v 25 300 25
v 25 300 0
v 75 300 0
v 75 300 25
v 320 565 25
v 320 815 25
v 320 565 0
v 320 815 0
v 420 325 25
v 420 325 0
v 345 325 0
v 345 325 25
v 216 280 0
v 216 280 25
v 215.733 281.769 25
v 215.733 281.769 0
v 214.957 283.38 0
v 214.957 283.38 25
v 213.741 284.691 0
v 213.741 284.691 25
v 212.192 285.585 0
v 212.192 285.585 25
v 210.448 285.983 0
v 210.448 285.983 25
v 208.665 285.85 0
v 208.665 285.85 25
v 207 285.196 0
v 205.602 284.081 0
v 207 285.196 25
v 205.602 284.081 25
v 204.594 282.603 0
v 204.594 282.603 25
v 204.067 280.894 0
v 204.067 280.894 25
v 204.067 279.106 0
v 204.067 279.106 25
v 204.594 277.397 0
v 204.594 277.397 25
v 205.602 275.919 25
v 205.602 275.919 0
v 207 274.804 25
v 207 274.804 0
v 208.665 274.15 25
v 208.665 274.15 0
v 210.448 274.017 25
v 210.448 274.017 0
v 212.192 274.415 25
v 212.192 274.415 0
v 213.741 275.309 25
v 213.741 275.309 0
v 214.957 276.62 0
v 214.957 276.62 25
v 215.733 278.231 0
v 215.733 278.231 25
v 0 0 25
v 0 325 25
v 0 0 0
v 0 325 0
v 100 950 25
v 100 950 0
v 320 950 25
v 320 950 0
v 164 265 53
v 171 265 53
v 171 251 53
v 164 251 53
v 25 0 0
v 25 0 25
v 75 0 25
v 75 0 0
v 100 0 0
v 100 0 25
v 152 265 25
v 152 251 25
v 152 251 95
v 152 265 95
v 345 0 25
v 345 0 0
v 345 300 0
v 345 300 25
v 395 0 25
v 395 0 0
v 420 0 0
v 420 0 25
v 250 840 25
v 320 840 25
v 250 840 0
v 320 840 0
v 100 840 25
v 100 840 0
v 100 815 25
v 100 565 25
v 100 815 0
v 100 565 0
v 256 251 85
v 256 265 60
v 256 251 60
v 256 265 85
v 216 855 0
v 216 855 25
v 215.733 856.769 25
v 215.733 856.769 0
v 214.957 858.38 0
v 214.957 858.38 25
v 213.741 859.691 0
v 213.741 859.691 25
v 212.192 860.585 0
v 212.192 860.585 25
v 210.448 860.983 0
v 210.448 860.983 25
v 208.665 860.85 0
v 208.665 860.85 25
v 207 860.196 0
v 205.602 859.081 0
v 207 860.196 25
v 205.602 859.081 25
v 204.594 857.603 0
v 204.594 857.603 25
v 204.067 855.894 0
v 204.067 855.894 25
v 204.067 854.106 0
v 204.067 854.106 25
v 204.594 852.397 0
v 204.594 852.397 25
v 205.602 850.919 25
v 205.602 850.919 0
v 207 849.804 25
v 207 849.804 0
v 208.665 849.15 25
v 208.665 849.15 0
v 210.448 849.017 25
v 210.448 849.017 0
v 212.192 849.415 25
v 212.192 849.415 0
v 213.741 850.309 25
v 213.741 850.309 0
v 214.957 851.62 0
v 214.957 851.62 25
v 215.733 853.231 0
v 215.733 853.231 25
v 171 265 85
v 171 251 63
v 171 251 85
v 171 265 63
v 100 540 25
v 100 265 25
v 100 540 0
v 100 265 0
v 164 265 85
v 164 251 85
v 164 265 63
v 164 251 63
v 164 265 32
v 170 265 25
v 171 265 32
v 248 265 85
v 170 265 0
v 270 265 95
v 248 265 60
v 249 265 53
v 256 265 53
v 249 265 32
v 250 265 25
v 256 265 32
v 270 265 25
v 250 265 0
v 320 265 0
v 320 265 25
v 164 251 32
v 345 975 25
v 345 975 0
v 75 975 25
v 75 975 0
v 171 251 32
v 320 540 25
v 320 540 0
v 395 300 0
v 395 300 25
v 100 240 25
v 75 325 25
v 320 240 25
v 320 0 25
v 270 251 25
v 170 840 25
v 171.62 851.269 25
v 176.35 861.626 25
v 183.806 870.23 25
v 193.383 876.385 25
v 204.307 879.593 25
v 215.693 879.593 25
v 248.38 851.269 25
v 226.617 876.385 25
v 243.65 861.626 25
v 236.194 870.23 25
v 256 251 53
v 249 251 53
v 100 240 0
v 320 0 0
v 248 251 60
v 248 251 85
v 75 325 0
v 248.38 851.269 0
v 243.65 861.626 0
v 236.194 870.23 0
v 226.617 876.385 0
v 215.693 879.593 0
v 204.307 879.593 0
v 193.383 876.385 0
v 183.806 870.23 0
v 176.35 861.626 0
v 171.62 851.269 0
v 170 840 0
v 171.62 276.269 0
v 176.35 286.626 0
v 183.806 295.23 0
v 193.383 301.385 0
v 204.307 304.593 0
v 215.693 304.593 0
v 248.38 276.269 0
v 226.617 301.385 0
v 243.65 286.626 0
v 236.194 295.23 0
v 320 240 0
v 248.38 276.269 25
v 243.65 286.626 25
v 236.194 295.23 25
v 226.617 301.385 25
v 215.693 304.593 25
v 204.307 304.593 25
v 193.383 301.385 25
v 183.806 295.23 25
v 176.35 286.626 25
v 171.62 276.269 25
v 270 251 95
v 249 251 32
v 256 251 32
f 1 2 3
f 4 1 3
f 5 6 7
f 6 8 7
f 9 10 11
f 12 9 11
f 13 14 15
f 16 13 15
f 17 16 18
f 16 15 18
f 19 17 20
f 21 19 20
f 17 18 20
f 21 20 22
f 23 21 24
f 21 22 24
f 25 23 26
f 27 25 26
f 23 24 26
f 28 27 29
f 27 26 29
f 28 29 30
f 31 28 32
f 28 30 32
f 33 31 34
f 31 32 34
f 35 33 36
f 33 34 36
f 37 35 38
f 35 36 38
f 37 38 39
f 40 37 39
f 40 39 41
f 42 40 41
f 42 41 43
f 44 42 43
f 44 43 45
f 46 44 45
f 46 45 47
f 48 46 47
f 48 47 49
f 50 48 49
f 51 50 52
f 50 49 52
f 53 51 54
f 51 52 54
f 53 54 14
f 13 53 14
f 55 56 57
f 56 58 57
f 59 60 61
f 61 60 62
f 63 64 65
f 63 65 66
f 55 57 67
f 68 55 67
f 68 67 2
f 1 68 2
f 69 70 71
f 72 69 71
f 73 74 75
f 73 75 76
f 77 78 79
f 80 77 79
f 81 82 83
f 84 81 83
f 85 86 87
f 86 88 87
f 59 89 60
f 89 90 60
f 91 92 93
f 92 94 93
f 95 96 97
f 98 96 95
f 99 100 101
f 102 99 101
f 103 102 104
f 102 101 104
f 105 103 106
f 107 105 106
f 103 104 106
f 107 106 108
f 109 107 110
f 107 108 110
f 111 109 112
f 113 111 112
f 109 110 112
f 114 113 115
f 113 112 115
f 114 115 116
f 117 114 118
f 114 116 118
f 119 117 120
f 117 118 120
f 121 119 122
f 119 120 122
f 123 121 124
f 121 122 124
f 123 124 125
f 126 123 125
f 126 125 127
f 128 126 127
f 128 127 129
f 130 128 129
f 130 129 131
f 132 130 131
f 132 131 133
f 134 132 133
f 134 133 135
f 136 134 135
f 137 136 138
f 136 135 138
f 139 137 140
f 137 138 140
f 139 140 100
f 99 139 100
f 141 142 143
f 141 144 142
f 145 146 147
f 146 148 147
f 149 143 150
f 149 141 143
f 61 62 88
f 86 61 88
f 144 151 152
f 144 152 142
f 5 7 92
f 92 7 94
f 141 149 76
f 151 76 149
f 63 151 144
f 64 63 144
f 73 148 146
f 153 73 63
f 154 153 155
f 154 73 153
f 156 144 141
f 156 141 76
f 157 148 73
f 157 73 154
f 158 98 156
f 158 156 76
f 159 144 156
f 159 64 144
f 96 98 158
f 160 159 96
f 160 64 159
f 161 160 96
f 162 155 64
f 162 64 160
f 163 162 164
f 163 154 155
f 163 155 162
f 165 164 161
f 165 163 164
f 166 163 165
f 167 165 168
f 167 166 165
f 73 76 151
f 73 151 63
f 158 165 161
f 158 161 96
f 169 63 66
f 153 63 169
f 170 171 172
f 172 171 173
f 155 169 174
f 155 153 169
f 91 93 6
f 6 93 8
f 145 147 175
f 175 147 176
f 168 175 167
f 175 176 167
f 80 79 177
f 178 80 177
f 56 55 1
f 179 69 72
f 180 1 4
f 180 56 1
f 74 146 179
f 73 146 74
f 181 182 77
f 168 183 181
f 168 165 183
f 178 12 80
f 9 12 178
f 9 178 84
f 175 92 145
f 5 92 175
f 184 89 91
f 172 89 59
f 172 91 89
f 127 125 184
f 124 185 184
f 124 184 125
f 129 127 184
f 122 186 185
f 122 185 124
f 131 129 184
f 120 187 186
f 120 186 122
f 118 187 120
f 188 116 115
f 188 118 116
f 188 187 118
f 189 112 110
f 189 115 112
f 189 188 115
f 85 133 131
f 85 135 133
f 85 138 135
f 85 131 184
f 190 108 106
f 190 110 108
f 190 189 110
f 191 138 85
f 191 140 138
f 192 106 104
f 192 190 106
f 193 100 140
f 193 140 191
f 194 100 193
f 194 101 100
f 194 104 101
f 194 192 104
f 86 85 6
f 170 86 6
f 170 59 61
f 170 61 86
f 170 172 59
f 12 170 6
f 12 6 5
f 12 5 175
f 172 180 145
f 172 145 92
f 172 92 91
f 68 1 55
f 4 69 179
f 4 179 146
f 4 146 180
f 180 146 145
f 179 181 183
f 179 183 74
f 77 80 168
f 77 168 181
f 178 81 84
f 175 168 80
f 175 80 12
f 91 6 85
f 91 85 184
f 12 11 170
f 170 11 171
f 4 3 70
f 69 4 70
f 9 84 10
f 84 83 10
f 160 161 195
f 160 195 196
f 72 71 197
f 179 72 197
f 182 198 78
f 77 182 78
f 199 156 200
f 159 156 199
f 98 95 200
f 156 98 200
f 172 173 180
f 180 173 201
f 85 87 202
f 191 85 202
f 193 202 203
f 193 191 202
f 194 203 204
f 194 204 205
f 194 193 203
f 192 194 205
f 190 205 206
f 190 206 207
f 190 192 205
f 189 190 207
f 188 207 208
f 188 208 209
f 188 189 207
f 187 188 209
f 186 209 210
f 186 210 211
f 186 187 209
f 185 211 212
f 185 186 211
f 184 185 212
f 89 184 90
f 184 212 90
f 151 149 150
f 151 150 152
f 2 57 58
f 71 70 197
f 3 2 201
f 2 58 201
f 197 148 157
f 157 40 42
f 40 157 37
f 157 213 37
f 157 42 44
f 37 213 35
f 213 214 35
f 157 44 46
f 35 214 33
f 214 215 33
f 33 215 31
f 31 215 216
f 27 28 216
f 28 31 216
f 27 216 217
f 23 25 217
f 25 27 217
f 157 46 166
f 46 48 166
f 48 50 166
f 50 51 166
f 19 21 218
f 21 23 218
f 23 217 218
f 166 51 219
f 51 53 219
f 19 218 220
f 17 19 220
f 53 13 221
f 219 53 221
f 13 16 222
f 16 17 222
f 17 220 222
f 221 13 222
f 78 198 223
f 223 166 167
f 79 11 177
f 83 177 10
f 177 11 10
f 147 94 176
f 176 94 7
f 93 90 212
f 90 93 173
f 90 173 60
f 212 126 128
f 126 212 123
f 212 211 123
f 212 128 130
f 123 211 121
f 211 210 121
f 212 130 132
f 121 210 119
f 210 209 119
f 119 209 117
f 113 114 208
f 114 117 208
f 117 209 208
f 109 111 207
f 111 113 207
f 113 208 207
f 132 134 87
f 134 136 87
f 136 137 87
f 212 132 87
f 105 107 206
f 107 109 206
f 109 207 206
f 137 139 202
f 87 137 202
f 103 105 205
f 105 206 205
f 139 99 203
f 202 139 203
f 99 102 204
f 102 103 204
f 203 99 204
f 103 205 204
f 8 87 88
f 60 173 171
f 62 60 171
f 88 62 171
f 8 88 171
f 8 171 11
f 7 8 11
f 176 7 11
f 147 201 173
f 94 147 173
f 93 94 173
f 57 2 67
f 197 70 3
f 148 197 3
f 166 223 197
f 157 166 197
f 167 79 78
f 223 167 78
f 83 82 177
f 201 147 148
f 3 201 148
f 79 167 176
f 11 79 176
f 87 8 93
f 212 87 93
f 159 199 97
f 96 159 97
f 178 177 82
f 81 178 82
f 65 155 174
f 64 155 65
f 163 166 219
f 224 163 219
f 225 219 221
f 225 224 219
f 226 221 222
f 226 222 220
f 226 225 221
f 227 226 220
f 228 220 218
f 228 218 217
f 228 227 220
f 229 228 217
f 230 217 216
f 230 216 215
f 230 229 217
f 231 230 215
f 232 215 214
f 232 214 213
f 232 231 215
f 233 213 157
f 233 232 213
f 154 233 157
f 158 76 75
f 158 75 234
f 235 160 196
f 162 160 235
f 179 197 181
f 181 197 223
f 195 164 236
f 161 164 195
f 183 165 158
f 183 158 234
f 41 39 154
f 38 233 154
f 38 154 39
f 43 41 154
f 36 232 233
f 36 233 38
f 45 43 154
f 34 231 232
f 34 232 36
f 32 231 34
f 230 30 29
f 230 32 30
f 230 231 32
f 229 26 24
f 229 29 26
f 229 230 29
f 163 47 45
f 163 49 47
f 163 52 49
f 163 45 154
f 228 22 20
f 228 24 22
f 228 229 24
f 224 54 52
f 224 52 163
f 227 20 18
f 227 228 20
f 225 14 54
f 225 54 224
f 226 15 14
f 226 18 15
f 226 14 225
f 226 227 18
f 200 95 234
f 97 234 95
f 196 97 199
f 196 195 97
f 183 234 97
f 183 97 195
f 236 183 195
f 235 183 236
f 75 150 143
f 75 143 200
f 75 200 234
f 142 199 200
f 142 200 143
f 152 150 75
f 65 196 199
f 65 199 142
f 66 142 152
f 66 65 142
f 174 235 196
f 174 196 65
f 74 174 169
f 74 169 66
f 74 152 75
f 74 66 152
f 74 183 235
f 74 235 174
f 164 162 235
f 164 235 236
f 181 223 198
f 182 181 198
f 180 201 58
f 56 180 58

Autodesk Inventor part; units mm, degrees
ref_plane "YZ Plane" through (0, 0, 0) normal (1, 0, 0) x (0, 1, 0)
ref_plane "XZ Plane" through (0, 0, 0) normal (0, 1, 0) x (-1, 0, 0)
ref_plane "XY Plane" through (0, 0, 0) normal (0, 0, 1) x (1, 0, 0)
sketch "Sketch1" plane through (0, 0, 0) normal (0, 0, 1) x (1, 0, 0)
  point P0 (0, 0)
sketch "Sketch2" plane through (0, 0, 0) normal (0, 0, 1) x (1, 0, 0)
  line L0 (0, 0) -> (25, 0)
  line L1 (25, 0) -> (25, 300)
  line L2 (25, 300) -> (75, 300)
  line L3 (75, 300) -> (75, 0)
  line L4 (75, 0) -> (100, 0)
  line L5 (100, 0) -> (100, 240)
  line L6 (100, 240) -> (320, 240)
  line L7 (320, 240) -> (320, 0)
  line L8 (320, 0) -> (345, 0)
  line L9 (345, 0) -> (345, 300)
  line L10 (345, 300) -> (395, 300)
  line L11 (395, 300) -> (395, 0)
  line L12 (395, 0) -> (420, 0)
  line L13 (420, 0) -> (420, 325)
  line L14 (420, 325) -> (345, 325)
  line L15 (345, 325) -> (345, 975)
  line L16 (345, 975) -> (75, 975)
  line L17 (75, 975) -> (75, 325)
  line L18 (75, 325) -> (0, 325)
  line L19 (0, 325) -> (0, 0)
  dimension "d0" = 25
  dimension "d1" = 300
  dimension "d2" = 50
  dimension "d3" = 300
  dimension "d4" = 25
  dimension "d5" = 240
  dimension "d6" = 220
  dimension "d7" = 240
  dimension "d8" = 25
  dimension "d9" = 300
  dimension "d10" = 50
  dimension "d11" = 300
  dimension "d12" = 25
  dimension "d13" = 325
  dimension "d14" = 75
  dimension "d15" = 650
  dimension "d16" = 270
  dimension "d17" = 650
  dimension "d18" = 75
sketch "Sketch3" plane through (0, 0, 0) normal (0, 0, 1) x (1, 0, 0)
  line L0 (100, 950) -> (320, 950)
  line L1 (320, 950) -> (320, 840)
  line L2 (320, 840) -> (100, 840)
  line L3 (100, 840) -> (100, 950)
  line L4 (100, 815) -> (320, 815)
  line L5 (320, 815) -> (320, 565)
  line L6 (320, 565) -> (100, 565)
  line L7 (100, 565) -> (100, 815)
  line L8 (100, 540) -> (320, 540)
  line L9 (320, 540) -> (320, 265)
  line L10 (320, 265) -> (100, 265)
  line L11 (100, 265) -> (100, 540)
  point P0 (0, 0)
  dimension "d19" = 220
  dimension "d20" = 110
  dimension "d21" = 220
  dimension "d22" = 250
  dimension "d23" = 220
  dimension "d24" = 275
extrude "Extrusion1" add sketch "Sketch2" along normal blind 25
extrude "Extrusion2" cut sketch "Sketch3" along normal through all
sketch "Sketch4" plane through (0, 0, 25) normal (0, 0, 1) x (1, 0, 0)
  line L0 (100, 840) -> (320, 840) projected
  arc A0 (250, 840) -> (170, 840) centre (210, 840) ccw
  point P0 (0, 0)
extrude "Extrusion3" add sketch "Sketch4" against normal blind 25
sketch "Sketch5" plane through (0, 0, 25) normal (0, 0, 1) x (1, 0, 0)
  point P0 (0, 0)
sketch "Sketch6" plane through (0, 0, 25) normal (0, 0, 1) x (1, 0, 0)
  line L0 (320, 265) -> (100, 265) projected
  arc A0 (250, 265) -> (170, 265) centre (210, 265) ccw
  point P0 (0, 0)
  dimension "d31" = 40
extrude "Extrusion4" add sketch "Sketch6" against normal blind 25
sketch "Sketch7" plane through (0, 0, 25) normal (0, 0, 1) x (1, 0, 0)
  line L0 (170, 265) -> (100, 265) projected
  line L1 (152, 265) -> (270, 265)
  line L2 (270, 265) -> (270, 251)
  line L3 (270, 251) -> (152, 251)
  line L4 (152, 251) -> (152, 265)
  point P0 (0, 0)
extrude "Extrusion5" add sketch "Sketch7" along normal blind 70
sketch "Sketch8" plane through (100, 265, 25) normal (0, 1, 0) x (1, 0, 0)
  point P0 (-100, 25)
sketch "Sketch9" plane through (100, 265, 25) normal (0, 1, 0) x (1, 0, 0)
  line L0 (64, -7) -> (71, -7)
  line L1 (71, -7) -> (71, -28)
  line L2 (71, -28) -> (64, -28)
  line L3 (64, -28) -> (64, -7)
  line L4 (64, -38) -> (71, -38)
  line L5 (71, -38) -> (71, -60)
  line L6 (71, -60) -> (64, -60)
  line L7 (64, -60) -> (64, -38)
  line L8 (149, -7) -> (156, -7)
  line L9 (156, -7) -> (156, -28)
  line L10 (156, -28) -> (149, -28)
  line L11 (149, -28) -> (149, -7)
  line L12 (148, -35) -> (156, -35)
  line L13 (156, -35) -> (156, -60)
  line L14 (156, -60) -> (148, -60)
  line L15 (148, -60) -> (148, -35)
  point P0 (-100, 25)
extrude "Extrusion6" cut sketch "Sketch9" against normal through all
sketch "Sketch10" plane through (0, 0, 25) normal (0, 0, 1) x (1, 0, 0)
  circle A0 centre (210, 280) radius 6
  point P0 (0, 0)
  dimension "d38" = 12
sketch "Sketch11" plane through (0, 0, 25) normal (0, 0, 1) x (1, 0, 0)
  circle A0 centre (210, 855) radius 6
  point P0 (0, 0)
  dimension "d39" = 12
extrude "Extrusion7" cut sketch "Sketch11" against normal through all
extrude "Extrusion8" cut sketch "Sketch10" against normal through all
properties part number "Frame_final"
